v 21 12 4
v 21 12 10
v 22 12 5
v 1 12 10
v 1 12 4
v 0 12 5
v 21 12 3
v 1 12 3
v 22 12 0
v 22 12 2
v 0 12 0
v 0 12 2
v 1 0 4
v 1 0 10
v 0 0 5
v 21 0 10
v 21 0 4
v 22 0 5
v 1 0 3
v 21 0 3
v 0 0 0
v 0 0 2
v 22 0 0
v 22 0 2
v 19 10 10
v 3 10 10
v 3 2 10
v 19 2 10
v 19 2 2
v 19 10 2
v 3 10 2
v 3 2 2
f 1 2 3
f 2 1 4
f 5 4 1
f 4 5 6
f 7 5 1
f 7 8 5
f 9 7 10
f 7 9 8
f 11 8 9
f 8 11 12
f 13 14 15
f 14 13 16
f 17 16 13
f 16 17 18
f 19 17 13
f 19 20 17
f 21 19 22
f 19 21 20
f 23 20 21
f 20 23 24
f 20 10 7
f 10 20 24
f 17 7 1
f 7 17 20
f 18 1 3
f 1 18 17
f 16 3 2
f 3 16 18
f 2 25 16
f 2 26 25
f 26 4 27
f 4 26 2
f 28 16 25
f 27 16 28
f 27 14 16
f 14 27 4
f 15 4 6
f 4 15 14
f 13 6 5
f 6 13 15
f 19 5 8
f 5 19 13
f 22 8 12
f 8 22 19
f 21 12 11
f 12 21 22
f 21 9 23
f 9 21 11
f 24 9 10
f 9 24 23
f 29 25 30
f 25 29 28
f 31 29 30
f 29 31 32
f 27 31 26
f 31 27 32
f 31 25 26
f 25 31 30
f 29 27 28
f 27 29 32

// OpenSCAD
module basePlug()
{
    difference(){
        translate([0,12,0])
        rotate([90,0,0])
        linear_extrude(12)
        polygon([
        [0,0],
        [0,2],
        [1,3],
        [1,4],
        [0,5],
        [1,10],
        [21,10],
        [22,5],
        [21,4],
        [21,3],
        [22,2],
        [22,0],
        [0,0]
        ]);
        translate([3,2,2])
        cube([16,8,8]);
    };
};


    basePlug();
